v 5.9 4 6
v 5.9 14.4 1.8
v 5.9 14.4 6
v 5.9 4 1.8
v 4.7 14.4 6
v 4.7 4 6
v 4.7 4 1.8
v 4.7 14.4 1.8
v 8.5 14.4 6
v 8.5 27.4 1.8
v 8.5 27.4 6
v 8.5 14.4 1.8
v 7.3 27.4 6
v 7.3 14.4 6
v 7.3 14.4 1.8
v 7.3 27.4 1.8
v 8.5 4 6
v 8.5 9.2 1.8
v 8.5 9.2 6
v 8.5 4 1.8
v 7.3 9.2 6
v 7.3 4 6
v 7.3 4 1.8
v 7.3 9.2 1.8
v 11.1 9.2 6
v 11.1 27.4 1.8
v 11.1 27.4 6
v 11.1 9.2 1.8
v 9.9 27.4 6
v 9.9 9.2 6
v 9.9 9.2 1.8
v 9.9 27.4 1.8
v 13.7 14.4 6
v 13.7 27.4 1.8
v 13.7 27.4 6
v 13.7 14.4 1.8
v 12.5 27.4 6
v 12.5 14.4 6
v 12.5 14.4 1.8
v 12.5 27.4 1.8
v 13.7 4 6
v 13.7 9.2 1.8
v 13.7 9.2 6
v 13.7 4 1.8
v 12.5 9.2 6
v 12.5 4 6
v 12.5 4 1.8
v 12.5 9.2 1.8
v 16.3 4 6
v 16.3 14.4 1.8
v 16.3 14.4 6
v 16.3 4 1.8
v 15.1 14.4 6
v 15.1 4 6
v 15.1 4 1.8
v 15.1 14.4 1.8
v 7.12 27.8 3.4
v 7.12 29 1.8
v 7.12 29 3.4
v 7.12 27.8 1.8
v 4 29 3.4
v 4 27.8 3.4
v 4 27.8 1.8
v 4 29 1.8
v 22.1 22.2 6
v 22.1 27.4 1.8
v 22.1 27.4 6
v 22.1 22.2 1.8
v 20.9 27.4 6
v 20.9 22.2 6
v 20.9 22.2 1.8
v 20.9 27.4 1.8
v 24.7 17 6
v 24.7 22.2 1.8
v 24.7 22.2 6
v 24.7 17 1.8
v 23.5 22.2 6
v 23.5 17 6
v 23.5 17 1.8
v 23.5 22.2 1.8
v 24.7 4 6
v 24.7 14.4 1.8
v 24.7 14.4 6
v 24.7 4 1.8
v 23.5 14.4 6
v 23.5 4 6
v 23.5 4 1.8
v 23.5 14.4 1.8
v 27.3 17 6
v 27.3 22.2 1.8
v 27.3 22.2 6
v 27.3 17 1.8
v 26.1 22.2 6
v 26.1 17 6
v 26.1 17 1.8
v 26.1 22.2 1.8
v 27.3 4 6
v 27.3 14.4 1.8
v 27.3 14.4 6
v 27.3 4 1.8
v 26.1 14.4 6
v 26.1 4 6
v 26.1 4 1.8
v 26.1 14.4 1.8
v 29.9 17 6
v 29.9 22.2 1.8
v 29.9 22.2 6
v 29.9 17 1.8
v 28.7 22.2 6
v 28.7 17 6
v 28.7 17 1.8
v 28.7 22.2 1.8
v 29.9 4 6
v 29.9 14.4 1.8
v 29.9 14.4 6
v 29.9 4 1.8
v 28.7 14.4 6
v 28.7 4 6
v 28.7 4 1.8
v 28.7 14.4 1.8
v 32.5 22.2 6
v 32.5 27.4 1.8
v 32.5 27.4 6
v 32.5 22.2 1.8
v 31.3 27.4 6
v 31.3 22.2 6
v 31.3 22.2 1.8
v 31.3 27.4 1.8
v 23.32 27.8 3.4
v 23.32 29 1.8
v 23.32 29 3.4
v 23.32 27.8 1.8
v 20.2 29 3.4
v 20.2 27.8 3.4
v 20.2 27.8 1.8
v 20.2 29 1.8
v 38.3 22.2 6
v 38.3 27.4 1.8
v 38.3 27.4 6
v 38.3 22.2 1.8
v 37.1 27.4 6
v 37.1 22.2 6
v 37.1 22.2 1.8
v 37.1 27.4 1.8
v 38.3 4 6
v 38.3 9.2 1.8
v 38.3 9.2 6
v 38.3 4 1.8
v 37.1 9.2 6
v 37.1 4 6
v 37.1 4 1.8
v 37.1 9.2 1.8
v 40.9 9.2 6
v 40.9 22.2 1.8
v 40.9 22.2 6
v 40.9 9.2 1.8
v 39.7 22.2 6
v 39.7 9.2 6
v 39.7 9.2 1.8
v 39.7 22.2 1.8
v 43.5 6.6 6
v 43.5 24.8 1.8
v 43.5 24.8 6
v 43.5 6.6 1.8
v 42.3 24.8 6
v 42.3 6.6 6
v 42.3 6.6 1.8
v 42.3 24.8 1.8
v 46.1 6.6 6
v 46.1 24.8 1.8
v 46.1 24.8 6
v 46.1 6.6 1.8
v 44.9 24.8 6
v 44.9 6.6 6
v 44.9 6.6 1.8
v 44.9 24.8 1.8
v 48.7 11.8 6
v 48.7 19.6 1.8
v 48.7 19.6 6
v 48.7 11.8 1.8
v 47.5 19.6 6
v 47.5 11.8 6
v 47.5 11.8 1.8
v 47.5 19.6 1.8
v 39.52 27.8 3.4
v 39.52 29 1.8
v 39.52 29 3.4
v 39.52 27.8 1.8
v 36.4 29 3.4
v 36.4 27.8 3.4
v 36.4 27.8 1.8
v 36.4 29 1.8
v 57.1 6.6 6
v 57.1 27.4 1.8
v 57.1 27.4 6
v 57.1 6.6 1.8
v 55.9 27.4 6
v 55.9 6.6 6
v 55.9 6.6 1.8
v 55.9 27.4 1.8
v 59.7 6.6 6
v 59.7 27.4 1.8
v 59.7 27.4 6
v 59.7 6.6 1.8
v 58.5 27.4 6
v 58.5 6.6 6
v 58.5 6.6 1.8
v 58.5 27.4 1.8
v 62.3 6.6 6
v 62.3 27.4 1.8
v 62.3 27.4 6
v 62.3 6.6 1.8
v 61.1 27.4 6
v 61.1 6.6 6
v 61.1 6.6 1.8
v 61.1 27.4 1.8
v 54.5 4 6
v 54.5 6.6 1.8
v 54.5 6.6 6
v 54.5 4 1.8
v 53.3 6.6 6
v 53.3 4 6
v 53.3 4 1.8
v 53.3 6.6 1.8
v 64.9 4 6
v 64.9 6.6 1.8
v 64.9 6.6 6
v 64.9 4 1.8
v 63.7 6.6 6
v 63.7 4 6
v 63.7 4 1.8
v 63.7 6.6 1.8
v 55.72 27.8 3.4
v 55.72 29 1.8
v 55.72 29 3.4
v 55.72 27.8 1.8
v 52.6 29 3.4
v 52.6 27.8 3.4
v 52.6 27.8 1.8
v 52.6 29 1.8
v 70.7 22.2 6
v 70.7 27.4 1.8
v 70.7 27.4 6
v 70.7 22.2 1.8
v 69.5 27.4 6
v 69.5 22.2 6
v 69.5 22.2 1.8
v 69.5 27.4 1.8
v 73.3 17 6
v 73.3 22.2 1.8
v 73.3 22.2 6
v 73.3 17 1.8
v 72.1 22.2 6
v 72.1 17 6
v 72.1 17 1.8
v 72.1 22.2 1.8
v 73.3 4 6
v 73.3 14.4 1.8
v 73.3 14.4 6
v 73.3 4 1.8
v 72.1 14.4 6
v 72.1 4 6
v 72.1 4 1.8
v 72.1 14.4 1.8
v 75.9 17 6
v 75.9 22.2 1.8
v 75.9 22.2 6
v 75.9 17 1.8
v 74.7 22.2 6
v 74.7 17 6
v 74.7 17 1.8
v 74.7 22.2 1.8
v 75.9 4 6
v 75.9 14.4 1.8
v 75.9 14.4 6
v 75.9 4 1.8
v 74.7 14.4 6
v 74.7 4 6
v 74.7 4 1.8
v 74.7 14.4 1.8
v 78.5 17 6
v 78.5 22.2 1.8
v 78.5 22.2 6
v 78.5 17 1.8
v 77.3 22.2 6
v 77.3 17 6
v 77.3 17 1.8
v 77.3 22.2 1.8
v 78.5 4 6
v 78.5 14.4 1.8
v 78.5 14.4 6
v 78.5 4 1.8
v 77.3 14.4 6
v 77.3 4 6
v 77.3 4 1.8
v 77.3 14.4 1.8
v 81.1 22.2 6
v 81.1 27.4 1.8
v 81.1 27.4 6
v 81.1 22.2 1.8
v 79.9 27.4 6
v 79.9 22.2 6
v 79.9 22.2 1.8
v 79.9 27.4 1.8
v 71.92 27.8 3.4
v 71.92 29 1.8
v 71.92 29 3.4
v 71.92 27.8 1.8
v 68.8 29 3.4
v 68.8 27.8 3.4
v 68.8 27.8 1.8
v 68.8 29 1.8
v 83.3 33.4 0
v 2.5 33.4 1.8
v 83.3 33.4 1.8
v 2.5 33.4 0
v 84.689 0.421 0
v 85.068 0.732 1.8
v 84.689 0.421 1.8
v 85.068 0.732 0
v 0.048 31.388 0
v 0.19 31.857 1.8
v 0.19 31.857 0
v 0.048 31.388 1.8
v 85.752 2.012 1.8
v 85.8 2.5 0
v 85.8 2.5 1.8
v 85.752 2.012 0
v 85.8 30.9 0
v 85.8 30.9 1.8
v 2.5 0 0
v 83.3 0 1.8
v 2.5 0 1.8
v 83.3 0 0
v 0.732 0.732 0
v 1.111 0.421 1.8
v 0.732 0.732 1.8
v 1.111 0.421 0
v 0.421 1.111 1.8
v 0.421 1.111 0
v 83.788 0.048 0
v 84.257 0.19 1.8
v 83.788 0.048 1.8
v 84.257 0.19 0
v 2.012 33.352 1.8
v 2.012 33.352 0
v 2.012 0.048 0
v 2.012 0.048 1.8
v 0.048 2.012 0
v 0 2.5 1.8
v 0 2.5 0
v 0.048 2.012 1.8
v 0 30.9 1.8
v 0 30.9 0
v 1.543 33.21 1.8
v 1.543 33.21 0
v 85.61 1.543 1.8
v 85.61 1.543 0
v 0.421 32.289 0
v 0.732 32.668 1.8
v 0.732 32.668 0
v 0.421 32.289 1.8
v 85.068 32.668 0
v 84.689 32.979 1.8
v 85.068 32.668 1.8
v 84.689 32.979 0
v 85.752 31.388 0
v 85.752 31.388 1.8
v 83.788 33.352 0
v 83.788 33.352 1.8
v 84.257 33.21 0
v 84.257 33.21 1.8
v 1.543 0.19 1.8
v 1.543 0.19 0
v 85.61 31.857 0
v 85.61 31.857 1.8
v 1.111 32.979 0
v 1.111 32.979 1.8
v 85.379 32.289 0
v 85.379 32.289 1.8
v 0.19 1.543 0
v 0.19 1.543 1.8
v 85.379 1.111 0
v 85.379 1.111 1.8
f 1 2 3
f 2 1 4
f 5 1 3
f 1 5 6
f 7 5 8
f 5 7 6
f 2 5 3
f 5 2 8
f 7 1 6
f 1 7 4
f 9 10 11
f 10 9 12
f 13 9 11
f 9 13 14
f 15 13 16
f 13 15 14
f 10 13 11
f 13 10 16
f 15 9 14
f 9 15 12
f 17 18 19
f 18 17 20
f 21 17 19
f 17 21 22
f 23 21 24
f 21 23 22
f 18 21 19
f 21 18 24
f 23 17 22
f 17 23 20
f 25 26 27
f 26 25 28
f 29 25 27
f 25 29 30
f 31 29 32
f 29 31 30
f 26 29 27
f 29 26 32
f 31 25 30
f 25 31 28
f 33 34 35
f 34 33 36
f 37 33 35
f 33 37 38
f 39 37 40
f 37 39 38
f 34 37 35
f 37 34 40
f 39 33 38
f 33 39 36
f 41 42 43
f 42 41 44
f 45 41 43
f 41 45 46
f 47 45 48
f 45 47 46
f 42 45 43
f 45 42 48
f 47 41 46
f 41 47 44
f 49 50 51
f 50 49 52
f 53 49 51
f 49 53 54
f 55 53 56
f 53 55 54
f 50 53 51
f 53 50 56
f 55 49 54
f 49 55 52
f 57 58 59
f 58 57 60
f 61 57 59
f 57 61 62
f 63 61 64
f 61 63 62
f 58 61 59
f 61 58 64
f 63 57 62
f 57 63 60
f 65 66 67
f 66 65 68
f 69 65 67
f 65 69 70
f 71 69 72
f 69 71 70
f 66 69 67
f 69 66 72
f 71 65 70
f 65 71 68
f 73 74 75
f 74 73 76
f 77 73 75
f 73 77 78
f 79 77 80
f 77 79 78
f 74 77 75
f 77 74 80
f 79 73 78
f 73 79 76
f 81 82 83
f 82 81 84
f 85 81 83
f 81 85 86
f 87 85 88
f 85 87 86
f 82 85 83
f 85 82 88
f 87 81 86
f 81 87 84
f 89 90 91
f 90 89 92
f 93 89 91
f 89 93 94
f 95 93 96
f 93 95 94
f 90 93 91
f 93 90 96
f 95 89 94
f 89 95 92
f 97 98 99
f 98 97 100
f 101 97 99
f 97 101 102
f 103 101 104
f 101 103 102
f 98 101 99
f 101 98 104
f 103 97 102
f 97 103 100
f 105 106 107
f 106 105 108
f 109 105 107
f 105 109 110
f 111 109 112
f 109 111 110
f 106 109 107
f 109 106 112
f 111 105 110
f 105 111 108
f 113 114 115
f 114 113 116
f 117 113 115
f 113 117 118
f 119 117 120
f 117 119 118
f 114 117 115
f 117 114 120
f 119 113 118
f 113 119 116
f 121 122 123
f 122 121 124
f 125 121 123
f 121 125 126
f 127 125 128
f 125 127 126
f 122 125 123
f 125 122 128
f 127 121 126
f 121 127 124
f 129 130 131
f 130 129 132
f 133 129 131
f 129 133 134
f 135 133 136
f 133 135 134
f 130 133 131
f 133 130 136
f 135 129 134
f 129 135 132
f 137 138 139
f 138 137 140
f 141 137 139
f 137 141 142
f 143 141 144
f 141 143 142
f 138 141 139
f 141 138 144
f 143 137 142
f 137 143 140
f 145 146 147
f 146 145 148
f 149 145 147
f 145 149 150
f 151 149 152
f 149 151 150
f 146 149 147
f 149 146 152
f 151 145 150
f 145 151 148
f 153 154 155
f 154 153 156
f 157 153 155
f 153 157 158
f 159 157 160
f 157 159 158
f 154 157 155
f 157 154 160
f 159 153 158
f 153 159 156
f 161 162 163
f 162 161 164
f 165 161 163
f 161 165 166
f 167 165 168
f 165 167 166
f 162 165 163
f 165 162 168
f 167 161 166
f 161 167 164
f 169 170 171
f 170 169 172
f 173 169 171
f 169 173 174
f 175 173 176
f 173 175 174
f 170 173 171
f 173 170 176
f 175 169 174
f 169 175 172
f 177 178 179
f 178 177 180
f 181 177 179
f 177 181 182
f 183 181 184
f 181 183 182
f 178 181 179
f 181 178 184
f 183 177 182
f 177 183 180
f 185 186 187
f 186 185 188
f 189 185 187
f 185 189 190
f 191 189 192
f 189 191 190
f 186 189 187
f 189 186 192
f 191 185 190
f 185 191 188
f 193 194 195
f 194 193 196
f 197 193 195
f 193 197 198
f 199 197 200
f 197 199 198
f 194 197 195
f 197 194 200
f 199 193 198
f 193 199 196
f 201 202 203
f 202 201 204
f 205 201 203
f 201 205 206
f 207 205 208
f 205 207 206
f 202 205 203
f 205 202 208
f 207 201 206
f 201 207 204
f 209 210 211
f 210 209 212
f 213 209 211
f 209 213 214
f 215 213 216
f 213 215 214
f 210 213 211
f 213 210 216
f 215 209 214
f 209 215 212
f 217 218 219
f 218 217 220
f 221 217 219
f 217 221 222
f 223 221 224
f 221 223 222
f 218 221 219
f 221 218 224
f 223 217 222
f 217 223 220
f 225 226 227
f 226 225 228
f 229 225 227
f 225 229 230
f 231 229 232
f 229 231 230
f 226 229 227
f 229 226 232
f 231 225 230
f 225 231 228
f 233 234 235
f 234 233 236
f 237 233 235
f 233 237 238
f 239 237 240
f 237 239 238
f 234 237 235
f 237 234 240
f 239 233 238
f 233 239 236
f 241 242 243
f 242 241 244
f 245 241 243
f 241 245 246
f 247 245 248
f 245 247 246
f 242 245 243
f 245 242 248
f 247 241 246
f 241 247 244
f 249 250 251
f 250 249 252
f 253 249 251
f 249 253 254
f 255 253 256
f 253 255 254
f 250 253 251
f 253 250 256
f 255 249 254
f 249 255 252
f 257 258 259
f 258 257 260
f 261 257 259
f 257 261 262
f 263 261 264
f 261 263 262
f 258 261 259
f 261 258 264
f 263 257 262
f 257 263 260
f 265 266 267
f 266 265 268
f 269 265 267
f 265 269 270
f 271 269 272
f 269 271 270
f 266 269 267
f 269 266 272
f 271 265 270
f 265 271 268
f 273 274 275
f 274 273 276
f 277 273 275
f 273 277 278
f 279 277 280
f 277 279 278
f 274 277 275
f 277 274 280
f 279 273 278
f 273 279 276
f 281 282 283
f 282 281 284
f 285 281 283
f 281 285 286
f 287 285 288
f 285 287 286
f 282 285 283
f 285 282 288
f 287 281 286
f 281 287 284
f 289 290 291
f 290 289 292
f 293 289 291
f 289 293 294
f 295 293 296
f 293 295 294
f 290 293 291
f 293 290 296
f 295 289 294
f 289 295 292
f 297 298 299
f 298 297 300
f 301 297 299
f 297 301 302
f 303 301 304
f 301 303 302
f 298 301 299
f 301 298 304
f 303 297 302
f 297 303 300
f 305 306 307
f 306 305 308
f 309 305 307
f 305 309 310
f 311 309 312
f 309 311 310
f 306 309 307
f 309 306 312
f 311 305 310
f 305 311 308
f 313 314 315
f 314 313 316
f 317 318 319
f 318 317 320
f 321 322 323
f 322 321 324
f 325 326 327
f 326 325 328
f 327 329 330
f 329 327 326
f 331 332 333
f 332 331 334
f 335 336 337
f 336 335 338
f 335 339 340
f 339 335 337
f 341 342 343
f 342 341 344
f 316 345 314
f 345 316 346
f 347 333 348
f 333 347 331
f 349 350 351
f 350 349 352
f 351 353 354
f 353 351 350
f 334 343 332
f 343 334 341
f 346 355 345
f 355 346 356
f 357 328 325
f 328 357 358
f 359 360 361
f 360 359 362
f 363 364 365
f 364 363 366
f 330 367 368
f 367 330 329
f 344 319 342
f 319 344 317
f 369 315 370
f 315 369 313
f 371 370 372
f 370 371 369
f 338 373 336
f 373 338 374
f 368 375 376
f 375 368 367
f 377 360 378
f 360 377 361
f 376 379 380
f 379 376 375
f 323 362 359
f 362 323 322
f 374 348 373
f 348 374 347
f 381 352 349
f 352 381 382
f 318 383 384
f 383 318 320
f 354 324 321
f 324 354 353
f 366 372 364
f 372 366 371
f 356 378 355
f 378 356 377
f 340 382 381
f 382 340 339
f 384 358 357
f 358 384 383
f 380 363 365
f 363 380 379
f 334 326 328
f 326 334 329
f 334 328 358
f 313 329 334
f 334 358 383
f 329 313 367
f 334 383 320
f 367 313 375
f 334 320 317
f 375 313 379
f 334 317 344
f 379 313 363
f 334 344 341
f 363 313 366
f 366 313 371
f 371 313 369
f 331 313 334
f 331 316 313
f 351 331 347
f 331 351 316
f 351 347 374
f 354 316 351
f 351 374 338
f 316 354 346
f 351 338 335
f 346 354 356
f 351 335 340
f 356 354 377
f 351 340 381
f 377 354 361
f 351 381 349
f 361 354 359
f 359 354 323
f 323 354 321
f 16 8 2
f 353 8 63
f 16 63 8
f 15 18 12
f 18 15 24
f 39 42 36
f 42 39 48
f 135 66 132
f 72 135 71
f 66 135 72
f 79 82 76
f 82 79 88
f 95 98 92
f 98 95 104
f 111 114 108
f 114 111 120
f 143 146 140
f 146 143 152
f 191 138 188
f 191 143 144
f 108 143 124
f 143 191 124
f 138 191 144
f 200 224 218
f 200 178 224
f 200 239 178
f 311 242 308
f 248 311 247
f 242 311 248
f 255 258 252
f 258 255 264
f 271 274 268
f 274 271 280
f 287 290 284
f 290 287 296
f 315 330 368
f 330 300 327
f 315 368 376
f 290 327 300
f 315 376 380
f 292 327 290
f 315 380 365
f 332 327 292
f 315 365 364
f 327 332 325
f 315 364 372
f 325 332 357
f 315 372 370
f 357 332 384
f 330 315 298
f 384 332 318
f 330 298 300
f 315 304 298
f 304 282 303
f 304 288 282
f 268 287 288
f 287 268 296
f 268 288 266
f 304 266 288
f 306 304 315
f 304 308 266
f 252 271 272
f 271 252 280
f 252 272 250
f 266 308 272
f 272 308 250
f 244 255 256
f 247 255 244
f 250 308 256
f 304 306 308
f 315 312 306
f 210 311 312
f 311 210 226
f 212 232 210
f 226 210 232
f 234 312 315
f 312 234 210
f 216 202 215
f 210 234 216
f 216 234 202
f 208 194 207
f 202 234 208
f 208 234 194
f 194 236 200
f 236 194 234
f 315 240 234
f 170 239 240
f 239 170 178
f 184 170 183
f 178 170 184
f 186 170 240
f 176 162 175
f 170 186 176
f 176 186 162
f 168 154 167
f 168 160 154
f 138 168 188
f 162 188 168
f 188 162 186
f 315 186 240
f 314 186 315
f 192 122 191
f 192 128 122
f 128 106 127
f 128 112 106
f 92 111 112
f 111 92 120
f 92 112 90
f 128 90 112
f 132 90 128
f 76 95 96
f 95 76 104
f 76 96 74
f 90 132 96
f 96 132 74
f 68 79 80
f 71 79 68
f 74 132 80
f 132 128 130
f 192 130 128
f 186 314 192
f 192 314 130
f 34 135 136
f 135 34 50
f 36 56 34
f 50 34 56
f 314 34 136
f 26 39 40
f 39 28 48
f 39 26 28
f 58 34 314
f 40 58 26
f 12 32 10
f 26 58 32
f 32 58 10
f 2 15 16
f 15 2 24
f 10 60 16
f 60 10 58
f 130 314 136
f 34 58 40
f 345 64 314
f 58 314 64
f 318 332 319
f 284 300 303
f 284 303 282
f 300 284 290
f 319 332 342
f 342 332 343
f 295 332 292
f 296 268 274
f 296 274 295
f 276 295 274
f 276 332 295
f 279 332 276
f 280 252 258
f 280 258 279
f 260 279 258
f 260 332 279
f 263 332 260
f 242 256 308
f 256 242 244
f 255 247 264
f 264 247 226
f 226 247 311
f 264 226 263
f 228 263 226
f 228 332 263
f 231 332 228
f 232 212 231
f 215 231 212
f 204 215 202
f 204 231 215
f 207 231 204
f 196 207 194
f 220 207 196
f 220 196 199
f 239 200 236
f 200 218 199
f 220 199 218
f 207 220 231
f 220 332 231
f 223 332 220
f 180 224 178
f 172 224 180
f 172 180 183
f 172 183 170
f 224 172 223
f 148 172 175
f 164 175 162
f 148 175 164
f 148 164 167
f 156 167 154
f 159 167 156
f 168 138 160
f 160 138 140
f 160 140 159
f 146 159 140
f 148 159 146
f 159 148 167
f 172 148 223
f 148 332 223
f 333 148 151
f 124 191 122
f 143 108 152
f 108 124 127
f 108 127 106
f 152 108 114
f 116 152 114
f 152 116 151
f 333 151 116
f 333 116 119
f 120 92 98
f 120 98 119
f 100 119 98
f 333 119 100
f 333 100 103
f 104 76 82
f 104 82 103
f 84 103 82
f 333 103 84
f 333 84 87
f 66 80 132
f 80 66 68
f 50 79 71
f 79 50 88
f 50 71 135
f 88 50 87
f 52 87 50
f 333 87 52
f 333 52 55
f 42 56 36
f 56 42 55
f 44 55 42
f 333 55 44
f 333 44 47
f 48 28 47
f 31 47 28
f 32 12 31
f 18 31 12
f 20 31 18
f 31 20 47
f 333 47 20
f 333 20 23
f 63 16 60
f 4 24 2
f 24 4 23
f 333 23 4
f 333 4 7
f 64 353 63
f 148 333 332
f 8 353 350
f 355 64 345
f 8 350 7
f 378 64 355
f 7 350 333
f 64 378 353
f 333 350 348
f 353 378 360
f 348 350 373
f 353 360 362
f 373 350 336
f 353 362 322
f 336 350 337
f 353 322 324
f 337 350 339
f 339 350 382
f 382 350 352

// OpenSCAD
// =============================================================================
// vacua_param.scad — standalone parametric generator for Vacua plates.
//
// Vacua: negative-space font on a 5 columns × 9 bands grid.
// Each column of a cell is conceptually filled with vertical strokes.
// We REMOVE the strokes where the letter's shape passes: the void draws the letter.
//
// The full alphabet is hard-coded below as tables indexed by character (via a
// lookup function). Editing `text` regenerates the model.
//
// PITFALLS TO MIND:
//   - Non-manifold: bars that cross at the same height produce coincident
//     faces (the "may not be a valid 2-manifold" warning).
//     Solution: (a) wrap each glyph in `union()`, (b) anchor the bars slightly
//     INSIDE the base (start at base_h - 0.4, height relief_h + 0.4).
//   - 90° rotation: the cell is 5×9, so NOT square. For rotation ligatures
//     you MUST work on a square 9×9 base with centering offset
//     offx = (9-5)/2 * cell. (Not used in this file but good to know for
//     variants.)
// =============================================================================

// -------- USER PARAMETERS ---------------------------------------------------
text          = "VACUA";    // Text to engrave (A-Z and ? are supported).
cols_tiles    = 0;          // Number of tile columns; 0 = everything on one line.
merged        = true;       // true: a single shared plate; false: separate tiles.
with_keyring  = false;      // true: adds a keyring on the first tile.

// Grid geometry (mm).
cell          = 2.6;        // Sub-cell size (1 column × 1 band).
bar_w         = 1.2;        // Vertical-stroke thickness.
relief_h      = 1.6;        // Relief height above the base.
base_h        = 1.8;        // Base/plate thickness.
tile_margin   = 1.6;        // Margin around the glyph inside its tile.
tile_gap      = 1.2;        // Gap between tiles (non-merged mode).
plate_border  = 2.4;        // Plate border (merged mode).
plate_r       = 2.5;        // Rounded-corner radius of the plate.
puce_on       = true;       // Show the marker at the top-left of each glyph.
round_bars    = false;      // true: cylindrical bars; false: cuboids.

// Keyring.
ring_outer    = 6.5;
ring_inner    = 3.0;
ring_overlap  = 2.0;        // Overlap depth with the first tile.

$fn = 32;

// -------- ALPHABET TABLE ----------------------------------------------------
// INK_BANDS[col] = list of EMPTY bands (= letter passes here).
// Convention: 0 = top, 8 = bottom. FULL = [0..8] = column entirely emptied.
// FILLED bands (= bars to draw) are the complement.
//
// The `ink_bands(ch, col)` function returns the vector for (ch, col).

function ink_bands(ch, col) =
    (ch == "A") ? [[2,3,4,5,6,7,8],[0,1,4],[0,1,4],[0,1,4],[2,3,4,5,6,7,8]][col] :
    (ch == "B") ? [[0,1,2,3,4,5,6,7,8],[0,4,8],[0,4,8],[0,4,8],[1,2,3,5,6,7]][col] :
    (ch == "C") ? [[2,3,4,5,6],[0,1,7,8],[0,8],[0,8],[0,1,2,6,7,8]][col] :
    (ch == "D") ? [[0,1,2,3,4,5,6,7,8],[0,8],[0,8],[1,7],[2,3,4,5,6]][col] :
    (ch == "E") ? [[0,1,2,3,4,5,6,7,8],[0,4,8],[0,4,8],[0,4,8],[0,4,8]][col] :
    (ch == "F") ? [[0,1,2,3,4,5,6,7,8],[0,4],[0,4],[0,4],[0]][col] :
    (ch == "G") ? [[2,3,4,5,6],[0,1,7,8],[0,8],[0,4,8],[2,3,4,8]][col] :
    (ch == "H") ? [[0,1,2,3,4,5,6,7,8],[4],[4],[4],[0,1,2,3,4,5,6,7,8]][col] :
    (ch == "I") ? [[0,1,7,8],[0,1,7,8],[0,1,2,3,4,5,6,7,8],[0,1,7,8],[0,1,7,8]][col] :
    (ch == "J") ? [[7],[8],[8],[0,1,2,3,4,5,6,7,8],[0,1,2,3,4,5,6,7,8]][col] :
    (ch == "K") ? [[0,1,2,3,4,5,6,7,8],[4],[3,5],[2,6],[0,1,7,8]][col] :
    (ch == "L") ? [[0,1,2,3,4,5,6,7,8],[8],[8],[8],[8]][col] :
    (ch == "M") ? [[0,1,2,3,4,5,6,7,8],[1,2],[3,4],[1,2],[0,1,2,3,4,5,6,7,8]][col] :
    (ch == "N") ? [[0,1,2,3,4,5,6,7,8],[2,3],[4],[5,6],[0,1,2,3,4,5,6,7,8]][col] :
    (ch == "O") ? [[2,3,4,5,6],[0,1,7,8],[0,8],[0,1,7,8],[2,3,4,5,6]][col] :
    (ch == "P") ? [[0,1,2,3,4,5,6,7,8],[0,4],[0,4],[0,4],[1,2,3]][col] :
    (ch == "Q") ? [[2,3,4,5,6],[0,1,7,8],[0,8],[0,1,7],[2,3,4,5,6,8]][col] :
    (ch == "R") ? [[0,1,2,3,4,5,6,7,8],[0,4],[0,4],[0,4,6],[1,2,3,7,8]][col] :
    (ch == "S") ? [[0,1,2,8],[0,4,8],[0,4,8],[0,4,8],[0,6,7,8]][col] :
    (ch == "T") ? [[0,1],[0,1],[0,1,2,3,4,5,6,7,8],[0,1],[0,1]][col] :
    (ch == "U") ? [[0,1,2,3,4,5,6,7],[8],[8],[8],[0,1,2,3,4,5,6,7]][col] :
    (ch == "V") ? [[0,1,2,3,4],[5,6],[7,8],[5,6],[0,1,2,3,4]][col] :
    (ch == "W") ? [[0,1,2,3,4,5,6,7,8],[6,7],[4,5],[6,7],[0,1,2,3,4,5,6,7,8]][col] :
    (ch == "X") ? [[0,1,7,8],[2,3,5,6],[4],[2,3,5,6],[0,1,7,8]][col] :
    (ch == "Y") ? [[0,1,2,3],[2,3,4],[0,1,2,3,4,5,6,7,8],[2,3,4],[0,1,2,3]][col] :
    (ch == "Z") ? [[0,1,7,8],[0,1,6,7,8],[0,1,4,7,8],[0,1,2,7,8],[0,1,7,8]][col] :
    (ch == "?") ? [[1,8],[0,3],[0,4,5,8],[0,3],[1,2]][col] :
    [];

// Filled band at (ch, col, b)? True if `b` is NOT in INK_BANDS[ch][col].
function is_filled(ch, col, b) =
    len(search([b], ink_bands(ch, col))[0]) == 0;

// -------- PRIMITIVES --------------------------------------------------------
N_COLS  = 5;
N_BANDS = 9;
GLYPH_W = N_COLS  * cell;
GLYPH_H = N_BANDS * cell;

// One vertical bar, anchored into the base (cf. anti non-manifold).
module bar(x, y_top, y_bot) {
    h = (y_bot - y_top) + 0.4 + relief_h;
    translate([x, y_top, base_h - 0.4])
        if (round_bars)
            translate([bar_w/2, (y_bot - y_top)/2, 0])
                cylinder(h = h, r = bar_w/2);
        else
            cube([bar_w, y_bot - y_top, h]);
}

// Top-left marker, acts as a visual/reading delimiter.
module puce(x0, y0) {
    if (puce_on) {
        translate([x0, y0 + GLYPH_H + 0.4, base_h - 0.4])
            cube([cell * 1.2, max(bar_w, 0.8), relief_h + 0.4]);
    }
}

// A full glyph (ch) placed at (x0, y0), wrapped in union() (anti non-manifold).
module glyph(ch, x0, y0) {
    union() {
        puce(x0, y0);
        for (col = [0 : N_COLS - 1]) {
            // Walk the bands and draw the contiguous filled segments.
            // No dynamic table: one bar per filled band (will be merged by union()).
            for (b = [0 : N_BANDS - 1]) {
                if (is_filled(ch, col, b)) {
                    x = x0 + col * cell + (cell - bar_w) / 2;
                    // y screen axis: 0 at the top → invert for SCAD (Y up).
                    y_top = y0 + (N_BANDS - 1 - b) * cell;
                    y_bot = y_top + cell;
                    bar(x, y_top, y_bot);
                }
            }
        }
    }
}

// Rounded plate (hull of 4 corner cylinders) — a single printable object.
module rounded_plate(w, h, r, t) {
    hull() {
        translate([r,        r,        0]) cylinder(h = t, r = r);
        translate([w - r,    r,        0]) cylinder(h = t, r = r);
        translate([r,        h - r,    0]) cylinder(h = t, r = r);
        translate([w - r,    h - r,    0]) cylinder(h = t, r = r);
    }
}

// Keyring, overlaps the first tile.
module keyring(x_left, y_center) {
    translate([x_left - ring_outer + ring_overlap, y_center, 0])
        difference() {
            cylinder(h = base_h, r = ring_outer);
            translate([0, 0, -0.5]) cylinder(h = base_h + 1, r = ring_inner);
        }
}

// -------- TEXT COMPOSITION --------------------------------------------------
// Iterate over the characters, build each glyph's position, then place all
// reliefs on ONE shared plate (merged mode) or on separate tiles.

function char_at(s, i) = (i >= len(s)) ? "" : s[i];
function n_chars(s) = len(s);

NTXT = n_chars(text);
ROWS = (cols_tiles == 0) ? 1 : ceil(NTXT / cols_tiles);
COLS = (cols_tiles == 0) ? NTXT : cols_tiles;

TILE_W = GLYPH_W + 2 * tile_margin;
TILE_H = GLYPH_H + 2 * tile_margin + bar_w + 0.8; // marker margin
STEP_X = TILE_W + (merged ? 0 : tile_gap);
STEP_Y = TILE_H + (merged ? 0 : tile_gap);

PLATE_W = COLS * TILE_W + 2 * plate_border;
PLATE_H = ROWS * TILE_H + 2 * plate_border;

module compose() {
    if (merged) {
        union() {
            rounded_plate(PLATE_W, PLATE_H, plate_r, base_h);
            if (with_keyring) keyring(plate_border, plate_border + TILE_H / 2);
            for (i = [0 : NTXT - 1]) {
                r = floor(i / COLS);
                c = i - r * COLS;
                x0 = plate_border + c * TILE_W + tile_margin;
                y0 = plate_border + (ROWS - 1 - r) * TILE_H + tile_margin;
                glyph(char_at(text, i), x0, y0);
            }
        }
    } else {
        for (i = [0 : NTXT - 1]) {
            r = floor(i / COLS);
            c = i - r * COLS;
            tx = c * STEP_X;
            ty = (ROWS - 1 - r) * STEP_Y;
            translate([tx, ty, 0]) {
                union() {
                    rounded_plate(TILE_W, TILE_H, plate_r, base_h);
                    if (with_keyring && i == 0)
                        keyring(0, TILE_H / 2);
                    glyph(char_at(text, i), tile_margin, tile_margin);
                }
            }
        }
    }
}

compose();
